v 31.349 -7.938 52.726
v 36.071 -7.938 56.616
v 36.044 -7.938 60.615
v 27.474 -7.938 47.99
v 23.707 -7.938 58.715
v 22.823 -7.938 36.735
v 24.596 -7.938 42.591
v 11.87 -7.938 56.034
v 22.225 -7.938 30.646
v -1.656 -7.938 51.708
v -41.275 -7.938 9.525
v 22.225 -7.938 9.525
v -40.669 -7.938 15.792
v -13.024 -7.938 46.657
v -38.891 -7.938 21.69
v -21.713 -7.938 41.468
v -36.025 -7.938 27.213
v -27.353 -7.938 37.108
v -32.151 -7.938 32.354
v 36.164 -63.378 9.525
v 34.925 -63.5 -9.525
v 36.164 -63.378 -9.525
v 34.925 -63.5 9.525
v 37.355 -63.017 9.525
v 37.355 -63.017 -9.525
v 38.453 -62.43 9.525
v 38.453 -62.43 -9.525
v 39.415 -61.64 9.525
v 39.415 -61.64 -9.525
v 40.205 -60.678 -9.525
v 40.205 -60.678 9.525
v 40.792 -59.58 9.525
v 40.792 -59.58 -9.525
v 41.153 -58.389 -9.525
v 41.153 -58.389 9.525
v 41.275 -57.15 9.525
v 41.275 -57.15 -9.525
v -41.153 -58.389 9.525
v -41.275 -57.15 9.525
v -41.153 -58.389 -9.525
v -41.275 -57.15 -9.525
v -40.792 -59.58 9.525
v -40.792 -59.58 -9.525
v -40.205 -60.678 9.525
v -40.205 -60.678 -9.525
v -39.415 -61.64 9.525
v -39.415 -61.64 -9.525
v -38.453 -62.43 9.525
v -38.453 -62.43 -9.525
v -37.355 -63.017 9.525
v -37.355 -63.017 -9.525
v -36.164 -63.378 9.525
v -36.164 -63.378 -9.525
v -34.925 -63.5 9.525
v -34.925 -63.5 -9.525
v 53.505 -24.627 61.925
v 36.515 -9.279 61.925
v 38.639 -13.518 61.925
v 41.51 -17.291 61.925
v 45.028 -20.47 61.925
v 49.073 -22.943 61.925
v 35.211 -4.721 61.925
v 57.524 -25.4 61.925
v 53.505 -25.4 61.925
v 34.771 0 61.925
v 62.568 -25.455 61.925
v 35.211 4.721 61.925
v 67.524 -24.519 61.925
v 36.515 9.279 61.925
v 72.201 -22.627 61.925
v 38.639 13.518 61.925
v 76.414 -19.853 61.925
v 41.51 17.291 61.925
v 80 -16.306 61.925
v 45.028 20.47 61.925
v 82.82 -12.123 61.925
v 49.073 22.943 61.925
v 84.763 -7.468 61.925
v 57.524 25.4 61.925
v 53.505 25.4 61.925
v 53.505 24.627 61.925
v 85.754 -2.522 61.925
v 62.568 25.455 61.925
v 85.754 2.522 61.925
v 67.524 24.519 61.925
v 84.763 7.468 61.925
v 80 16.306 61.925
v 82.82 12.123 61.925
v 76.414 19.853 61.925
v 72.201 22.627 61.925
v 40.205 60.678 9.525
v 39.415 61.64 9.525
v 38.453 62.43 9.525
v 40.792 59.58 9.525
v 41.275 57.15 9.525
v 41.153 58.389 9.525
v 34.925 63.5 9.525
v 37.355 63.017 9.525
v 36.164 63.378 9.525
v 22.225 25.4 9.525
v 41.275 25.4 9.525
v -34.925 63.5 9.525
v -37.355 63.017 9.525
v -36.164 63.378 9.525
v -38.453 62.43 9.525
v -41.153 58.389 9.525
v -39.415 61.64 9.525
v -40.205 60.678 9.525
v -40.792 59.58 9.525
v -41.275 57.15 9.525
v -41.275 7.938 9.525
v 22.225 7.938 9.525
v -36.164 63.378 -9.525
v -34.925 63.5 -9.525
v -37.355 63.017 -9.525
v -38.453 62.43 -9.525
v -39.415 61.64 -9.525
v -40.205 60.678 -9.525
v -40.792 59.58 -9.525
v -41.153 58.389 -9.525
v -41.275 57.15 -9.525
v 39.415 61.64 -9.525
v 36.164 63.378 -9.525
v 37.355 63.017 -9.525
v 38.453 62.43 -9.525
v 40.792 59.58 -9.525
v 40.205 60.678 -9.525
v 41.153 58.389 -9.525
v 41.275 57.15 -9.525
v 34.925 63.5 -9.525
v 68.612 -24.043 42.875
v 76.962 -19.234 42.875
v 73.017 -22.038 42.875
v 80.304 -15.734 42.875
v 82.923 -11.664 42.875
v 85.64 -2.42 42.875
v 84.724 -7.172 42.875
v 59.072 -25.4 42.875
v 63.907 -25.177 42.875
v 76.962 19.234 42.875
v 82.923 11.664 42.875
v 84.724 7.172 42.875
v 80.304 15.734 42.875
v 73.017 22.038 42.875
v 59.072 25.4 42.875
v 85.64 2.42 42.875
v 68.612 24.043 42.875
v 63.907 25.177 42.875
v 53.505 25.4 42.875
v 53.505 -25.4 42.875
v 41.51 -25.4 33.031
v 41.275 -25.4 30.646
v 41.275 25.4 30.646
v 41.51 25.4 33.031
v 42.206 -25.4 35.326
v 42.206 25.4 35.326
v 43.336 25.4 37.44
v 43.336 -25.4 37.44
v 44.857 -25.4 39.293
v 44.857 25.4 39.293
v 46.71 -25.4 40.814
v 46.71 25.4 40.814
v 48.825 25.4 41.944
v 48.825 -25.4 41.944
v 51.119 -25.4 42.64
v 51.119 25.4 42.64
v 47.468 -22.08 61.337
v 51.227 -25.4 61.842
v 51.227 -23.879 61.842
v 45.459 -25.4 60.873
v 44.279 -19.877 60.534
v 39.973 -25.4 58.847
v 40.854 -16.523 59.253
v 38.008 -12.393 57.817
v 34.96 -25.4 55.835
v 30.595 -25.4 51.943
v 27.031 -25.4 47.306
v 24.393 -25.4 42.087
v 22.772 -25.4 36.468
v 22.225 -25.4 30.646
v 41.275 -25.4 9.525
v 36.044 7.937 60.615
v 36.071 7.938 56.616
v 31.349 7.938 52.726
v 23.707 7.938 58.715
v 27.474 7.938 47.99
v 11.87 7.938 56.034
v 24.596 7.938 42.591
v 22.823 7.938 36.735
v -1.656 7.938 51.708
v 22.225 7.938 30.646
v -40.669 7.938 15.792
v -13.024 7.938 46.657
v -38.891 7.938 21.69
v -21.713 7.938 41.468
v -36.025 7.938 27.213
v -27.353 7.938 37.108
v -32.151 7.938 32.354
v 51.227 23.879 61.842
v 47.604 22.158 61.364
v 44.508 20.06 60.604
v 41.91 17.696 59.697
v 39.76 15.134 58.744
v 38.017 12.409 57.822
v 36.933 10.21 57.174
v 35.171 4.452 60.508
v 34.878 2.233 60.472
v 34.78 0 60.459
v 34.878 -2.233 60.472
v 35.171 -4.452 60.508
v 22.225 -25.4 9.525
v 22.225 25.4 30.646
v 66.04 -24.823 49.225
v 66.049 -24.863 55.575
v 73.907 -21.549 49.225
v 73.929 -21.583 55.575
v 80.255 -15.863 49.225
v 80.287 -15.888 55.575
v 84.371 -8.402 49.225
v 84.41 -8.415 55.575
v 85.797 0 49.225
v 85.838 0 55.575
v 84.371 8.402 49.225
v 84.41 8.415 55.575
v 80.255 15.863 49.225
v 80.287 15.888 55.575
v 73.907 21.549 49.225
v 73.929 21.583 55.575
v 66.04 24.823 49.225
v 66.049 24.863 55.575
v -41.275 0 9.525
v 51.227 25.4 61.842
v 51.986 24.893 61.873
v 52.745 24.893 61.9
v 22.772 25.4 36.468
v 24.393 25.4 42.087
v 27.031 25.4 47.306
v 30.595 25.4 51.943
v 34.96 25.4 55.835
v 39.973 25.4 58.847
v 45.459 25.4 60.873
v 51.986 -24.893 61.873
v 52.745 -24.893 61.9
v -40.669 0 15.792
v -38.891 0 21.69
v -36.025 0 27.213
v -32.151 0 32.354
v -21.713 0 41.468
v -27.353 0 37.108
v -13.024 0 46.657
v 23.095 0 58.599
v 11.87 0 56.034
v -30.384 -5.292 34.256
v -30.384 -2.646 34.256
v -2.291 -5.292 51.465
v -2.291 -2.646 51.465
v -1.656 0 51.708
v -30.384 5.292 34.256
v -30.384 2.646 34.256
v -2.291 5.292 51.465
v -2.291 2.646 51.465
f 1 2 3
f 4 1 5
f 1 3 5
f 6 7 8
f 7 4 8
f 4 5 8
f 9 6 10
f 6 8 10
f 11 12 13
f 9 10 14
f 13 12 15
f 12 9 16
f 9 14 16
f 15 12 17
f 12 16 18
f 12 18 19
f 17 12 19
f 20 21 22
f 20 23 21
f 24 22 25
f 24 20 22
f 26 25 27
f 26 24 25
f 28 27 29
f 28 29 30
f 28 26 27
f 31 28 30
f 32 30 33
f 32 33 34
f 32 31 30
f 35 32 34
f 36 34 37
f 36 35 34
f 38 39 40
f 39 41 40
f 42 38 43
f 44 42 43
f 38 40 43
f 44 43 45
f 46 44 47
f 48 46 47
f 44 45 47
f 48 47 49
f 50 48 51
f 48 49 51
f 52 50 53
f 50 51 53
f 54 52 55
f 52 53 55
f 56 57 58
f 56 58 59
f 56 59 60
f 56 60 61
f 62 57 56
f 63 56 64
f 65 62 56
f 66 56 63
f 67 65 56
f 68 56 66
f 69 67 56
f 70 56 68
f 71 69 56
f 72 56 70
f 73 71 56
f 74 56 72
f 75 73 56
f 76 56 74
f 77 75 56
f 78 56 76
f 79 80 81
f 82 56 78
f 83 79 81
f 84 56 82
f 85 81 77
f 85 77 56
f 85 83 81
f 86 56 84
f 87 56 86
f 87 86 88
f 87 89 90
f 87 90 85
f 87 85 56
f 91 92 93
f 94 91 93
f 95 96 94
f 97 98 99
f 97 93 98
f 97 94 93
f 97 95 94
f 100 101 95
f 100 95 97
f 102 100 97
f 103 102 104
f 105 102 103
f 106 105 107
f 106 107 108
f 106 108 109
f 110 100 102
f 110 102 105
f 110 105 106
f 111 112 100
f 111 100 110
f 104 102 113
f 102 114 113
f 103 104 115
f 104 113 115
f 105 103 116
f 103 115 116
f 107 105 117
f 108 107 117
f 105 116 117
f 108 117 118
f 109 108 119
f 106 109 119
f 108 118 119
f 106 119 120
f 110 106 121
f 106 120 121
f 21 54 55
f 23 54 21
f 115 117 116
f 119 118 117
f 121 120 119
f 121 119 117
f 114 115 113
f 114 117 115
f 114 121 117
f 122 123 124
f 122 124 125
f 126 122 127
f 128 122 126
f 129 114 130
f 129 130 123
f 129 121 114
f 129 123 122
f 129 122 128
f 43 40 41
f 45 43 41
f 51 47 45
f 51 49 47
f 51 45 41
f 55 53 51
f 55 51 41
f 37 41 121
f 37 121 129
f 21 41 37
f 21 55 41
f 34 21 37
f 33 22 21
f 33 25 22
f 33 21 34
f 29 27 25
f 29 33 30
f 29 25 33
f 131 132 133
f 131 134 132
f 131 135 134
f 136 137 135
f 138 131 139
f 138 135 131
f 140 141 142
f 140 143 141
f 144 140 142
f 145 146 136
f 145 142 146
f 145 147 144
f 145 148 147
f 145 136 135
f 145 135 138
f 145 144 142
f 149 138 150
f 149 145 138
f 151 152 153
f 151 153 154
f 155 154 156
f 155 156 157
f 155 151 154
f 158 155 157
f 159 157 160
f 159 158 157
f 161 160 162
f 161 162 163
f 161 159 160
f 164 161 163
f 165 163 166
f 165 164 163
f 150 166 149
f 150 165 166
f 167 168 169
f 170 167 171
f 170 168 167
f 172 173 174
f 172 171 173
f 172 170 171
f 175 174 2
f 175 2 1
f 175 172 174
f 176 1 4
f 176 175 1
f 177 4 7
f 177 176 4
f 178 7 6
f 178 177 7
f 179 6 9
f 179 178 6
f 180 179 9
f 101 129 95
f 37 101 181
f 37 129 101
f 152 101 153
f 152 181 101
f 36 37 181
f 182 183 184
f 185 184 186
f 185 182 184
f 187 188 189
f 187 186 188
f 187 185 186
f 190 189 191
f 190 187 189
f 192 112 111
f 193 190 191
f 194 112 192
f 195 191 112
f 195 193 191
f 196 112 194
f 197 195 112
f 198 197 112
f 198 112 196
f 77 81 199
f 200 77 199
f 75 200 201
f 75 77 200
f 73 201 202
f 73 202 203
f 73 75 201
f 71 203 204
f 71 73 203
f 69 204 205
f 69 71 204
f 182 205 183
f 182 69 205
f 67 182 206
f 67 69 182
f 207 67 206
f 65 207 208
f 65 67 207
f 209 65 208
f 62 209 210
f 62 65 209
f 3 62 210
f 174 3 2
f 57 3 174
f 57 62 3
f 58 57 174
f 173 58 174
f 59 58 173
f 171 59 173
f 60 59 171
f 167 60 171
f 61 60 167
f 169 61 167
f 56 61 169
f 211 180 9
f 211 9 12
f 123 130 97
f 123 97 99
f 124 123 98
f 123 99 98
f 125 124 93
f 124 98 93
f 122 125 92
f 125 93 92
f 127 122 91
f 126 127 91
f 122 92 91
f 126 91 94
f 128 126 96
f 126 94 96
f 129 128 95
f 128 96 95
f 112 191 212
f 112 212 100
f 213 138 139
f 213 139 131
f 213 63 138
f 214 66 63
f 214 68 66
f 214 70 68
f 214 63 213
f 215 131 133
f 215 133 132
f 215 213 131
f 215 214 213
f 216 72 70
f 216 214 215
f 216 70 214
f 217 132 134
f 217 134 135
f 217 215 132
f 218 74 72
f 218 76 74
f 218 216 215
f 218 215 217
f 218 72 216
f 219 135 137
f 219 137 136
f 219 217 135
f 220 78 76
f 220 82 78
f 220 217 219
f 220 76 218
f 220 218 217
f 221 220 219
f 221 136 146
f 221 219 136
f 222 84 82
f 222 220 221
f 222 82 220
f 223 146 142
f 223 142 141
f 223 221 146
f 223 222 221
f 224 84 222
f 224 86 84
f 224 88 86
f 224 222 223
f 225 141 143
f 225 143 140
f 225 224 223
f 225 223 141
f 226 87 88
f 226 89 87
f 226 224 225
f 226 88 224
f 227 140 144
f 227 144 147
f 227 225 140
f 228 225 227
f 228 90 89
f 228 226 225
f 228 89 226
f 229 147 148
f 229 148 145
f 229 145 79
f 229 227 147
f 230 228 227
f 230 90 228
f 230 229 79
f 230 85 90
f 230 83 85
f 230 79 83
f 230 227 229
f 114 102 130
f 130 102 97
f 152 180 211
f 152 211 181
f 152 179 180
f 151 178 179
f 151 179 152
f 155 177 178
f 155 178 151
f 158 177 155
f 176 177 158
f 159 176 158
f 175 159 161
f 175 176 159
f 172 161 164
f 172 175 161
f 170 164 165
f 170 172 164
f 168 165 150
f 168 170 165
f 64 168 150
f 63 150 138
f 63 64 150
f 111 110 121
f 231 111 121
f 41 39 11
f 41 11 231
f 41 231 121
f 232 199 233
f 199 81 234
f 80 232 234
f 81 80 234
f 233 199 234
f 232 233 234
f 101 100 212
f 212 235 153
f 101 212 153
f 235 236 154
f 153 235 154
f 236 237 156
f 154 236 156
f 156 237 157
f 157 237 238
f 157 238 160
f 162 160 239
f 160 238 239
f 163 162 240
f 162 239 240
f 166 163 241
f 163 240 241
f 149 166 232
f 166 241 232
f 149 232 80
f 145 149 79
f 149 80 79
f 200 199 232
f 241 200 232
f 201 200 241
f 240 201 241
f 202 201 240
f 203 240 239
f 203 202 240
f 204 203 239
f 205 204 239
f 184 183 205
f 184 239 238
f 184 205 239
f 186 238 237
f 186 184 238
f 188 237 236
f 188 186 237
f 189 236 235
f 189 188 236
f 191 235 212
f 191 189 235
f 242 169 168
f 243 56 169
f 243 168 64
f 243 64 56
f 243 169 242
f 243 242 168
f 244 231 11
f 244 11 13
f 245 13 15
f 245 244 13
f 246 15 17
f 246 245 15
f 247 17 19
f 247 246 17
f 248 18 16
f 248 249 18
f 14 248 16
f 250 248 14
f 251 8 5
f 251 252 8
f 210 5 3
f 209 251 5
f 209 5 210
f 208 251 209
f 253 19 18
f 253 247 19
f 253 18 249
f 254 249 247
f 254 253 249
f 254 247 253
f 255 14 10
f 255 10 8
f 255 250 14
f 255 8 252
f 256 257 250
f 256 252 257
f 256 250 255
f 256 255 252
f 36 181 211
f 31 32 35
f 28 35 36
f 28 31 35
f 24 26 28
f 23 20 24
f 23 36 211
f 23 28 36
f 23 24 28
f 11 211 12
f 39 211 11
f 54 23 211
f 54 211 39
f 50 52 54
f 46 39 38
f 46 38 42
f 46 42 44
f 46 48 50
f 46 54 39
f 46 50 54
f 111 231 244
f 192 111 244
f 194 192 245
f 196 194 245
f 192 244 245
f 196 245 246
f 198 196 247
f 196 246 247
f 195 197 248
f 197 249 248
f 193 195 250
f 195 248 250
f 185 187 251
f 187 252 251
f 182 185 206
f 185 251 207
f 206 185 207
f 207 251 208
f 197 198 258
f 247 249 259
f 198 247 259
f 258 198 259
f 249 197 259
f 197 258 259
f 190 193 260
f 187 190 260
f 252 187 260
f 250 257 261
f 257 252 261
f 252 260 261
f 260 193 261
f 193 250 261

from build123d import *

# Parameters (mm, degrees)
F1_DEPTH = 63.5
F2_DEPTH = 25.4
F3_DEPTH = 7.9375
F5_R     = 6.35


with BuildPart() as f1:
    # F0 (on Front) → F1 (new body, symmetric)
    with BuildSketch(Plane.XZ):
        Polygon((-41.275, 9.525), (-41.275, -9.525), (41.275, -9.525), (41.275, 9.525), (22.225, 9.525), align=None)
    extrude(amount=F1_DEPTH, both=True)

    # F0 (on Front) → F2 (join, symmetric)
    with BuildSketch(Plane.XZ):
        with BuildLine():
            Line((22.225, 9.525), (41.275, 9.525))
            Line((41.275, 9.525), (41.275, 30.6455698351))
            ThreePointArc((41.275, 30.6455698351), (44.8569757439, 39.2932242561), (53.5046301649, 42.8752))
            Line((53.5046301649, 42.8752), (60.325, 42.8752))
            Line((60.325, 42.8752), (60.325, 61.9252))
            Line((60.325, 61.9252), (53.5046301649, 61.9252))
            add(Edge.make_bspline(
                [(51.2267353125, 61.8421475047), (51.9857307237, 61.8741703131), (52.7450911942, 61.9018592787), (53.5046301649, 61.9252)],
                knots=[106.5779912672, 106.5779912672, 106.5779912672, 106.5779912672, 108.3003197328, 108.3003197328, 108.3003197328, 108.3003197328], degree=3))
            ThreePointArc((51.2267353125, 61.8421475047), (30.595385614, 51.943029246), (22.225, 30.6455698351))
            Line((22.225, 30.6455698351), (22.225, 9.525))
        make_face()
    extrude(amount=F2_DEPTH, both=True)

    # F0 (on Front) → F3 (join, symmetric)
    with BuildSketch(Plane.XZ):
        with BuildLine():
            add(Edge.make_bspline(
                [(-41.275, 9.525), (-41.3089372245, 41.2840319087), (4.2599645019, 59.8605704357), (51.2267353125, 61.8421475047)],
                knots=[0, 0, 0, 0, 106.5779912672, 106.5779912672, 106.5779912672, 106.5779912672], degree=3))
            Line((-41.275, 9.525), (22.225, 9.525))
            Line((22.225, 9.525), (22.225, 30.6455698351))
            ThreePointArc((22.225, 30.6455698351), (30.595385614, 51.943029246), (51.2267353125, 61.8421475047))
        make_face()
    extrude(amount=F3_DEPTH, both=True)

    # F0 (on Front) → F4 (revolve)
    with BuildSketch(Plane.XZ):
        Polygon((85.8790065383, 61.9252), (60.325, 61.9252), (60.325, 42.8752), (85.7558669821, 42.8752), align=None)
    revolve(axis=Axis((60.325, 0, 52.3875), (0, 0, 1)))

    # F5
    f5_edges = [f1.edges().sort_by_distance(p)[0] for p in [
        (-41.275, -63.5, 0),
        (41.275, -63.5, 0),
        (41.275, 63.5, 0),
        (-41.275, 63.5, 0),
    ]]
    fillet(f5_edges, radius=F5_R)


solid = f1.part
